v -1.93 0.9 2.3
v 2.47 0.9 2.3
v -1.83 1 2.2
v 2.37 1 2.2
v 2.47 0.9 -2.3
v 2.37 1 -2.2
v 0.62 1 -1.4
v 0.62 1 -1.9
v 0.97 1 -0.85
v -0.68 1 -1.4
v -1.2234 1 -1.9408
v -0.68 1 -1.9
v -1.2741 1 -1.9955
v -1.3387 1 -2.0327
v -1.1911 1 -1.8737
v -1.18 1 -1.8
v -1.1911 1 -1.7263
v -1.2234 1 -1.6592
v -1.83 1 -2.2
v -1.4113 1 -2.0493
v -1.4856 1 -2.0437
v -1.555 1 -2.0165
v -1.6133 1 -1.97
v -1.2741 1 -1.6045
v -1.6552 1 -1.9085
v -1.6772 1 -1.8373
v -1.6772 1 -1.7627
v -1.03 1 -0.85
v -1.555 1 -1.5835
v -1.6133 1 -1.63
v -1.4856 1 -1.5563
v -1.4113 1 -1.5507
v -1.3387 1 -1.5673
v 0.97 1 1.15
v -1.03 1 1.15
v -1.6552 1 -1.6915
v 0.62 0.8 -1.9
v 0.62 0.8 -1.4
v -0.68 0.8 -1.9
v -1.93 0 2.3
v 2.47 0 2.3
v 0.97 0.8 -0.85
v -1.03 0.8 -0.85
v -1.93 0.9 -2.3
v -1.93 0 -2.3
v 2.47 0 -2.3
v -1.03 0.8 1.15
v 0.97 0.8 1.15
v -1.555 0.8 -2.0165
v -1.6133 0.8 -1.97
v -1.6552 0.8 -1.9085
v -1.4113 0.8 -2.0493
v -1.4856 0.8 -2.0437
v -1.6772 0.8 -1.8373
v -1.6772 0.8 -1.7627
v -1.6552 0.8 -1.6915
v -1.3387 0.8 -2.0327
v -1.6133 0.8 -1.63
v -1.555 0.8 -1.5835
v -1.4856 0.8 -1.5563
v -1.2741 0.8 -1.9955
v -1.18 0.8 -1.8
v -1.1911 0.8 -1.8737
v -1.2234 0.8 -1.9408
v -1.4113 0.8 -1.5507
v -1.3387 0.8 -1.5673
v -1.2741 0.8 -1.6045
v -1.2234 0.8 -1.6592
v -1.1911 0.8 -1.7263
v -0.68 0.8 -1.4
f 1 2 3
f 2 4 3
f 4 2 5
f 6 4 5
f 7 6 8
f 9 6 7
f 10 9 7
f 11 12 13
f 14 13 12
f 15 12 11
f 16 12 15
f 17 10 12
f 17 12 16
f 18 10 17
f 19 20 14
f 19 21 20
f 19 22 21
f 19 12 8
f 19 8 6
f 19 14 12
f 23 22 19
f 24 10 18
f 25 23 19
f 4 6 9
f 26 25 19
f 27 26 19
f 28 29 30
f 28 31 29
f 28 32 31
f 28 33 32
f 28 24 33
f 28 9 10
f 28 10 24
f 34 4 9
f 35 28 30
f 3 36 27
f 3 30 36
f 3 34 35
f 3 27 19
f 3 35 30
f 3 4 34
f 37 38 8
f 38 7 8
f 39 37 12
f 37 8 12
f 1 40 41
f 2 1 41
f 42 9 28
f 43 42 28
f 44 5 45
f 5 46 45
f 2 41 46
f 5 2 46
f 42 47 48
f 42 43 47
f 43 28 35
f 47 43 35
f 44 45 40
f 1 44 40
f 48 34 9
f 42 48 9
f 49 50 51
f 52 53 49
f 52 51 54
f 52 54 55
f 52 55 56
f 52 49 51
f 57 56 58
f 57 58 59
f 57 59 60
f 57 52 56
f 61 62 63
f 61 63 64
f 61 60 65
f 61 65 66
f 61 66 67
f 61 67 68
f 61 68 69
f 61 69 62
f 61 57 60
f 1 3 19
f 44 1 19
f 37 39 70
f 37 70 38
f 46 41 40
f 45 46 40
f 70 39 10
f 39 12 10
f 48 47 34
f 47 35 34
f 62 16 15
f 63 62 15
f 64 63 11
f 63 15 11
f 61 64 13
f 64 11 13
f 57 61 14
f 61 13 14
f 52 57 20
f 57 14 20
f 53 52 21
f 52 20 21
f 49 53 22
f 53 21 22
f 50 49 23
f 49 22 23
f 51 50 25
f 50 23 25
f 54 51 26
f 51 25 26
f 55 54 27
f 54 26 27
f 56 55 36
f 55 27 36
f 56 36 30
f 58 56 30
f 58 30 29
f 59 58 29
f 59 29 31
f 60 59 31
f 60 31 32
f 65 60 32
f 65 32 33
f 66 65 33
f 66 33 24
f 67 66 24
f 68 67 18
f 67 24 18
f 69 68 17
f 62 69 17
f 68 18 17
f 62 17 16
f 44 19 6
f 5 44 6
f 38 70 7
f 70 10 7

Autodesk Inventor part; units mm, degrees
ref_plane "YZ Plane" through (0, 0, 0) normal (1, 0, 0) x (0, 1, 0)
ref_plane "XZ Plane" through (0, 0, 0) normal (0, 1, 0) x (-1, 0, 0)
sketch "Sketch1" plane through (0, 0, 0) normal (0, 1, 0) x (-1, 0, 0)
  line L0 (1.93, 2.3) -> (-2.47, 2.3)
  line L1 (-2.47, 2.3) -> (-2.47, -2.3)
  line L2 (-2.47, -2.3) -> (1.93, -2.3)
  line L3 (1.93, -2.3) -> (1.93, 2.3)
  line L4 (0, -3.22) -> (0, 3.22) construction
  line L5 (2.81, 0) -> (-3.35, 0) construction
  point P0 (0, 0)
  point P1 (-0.27, 2.3)
  point P2 (1.93, 0)
  dimension "d0" = 4.4
  dimension "d1" = 4.6
  dimension "d2" = 0.27
extrude "Extrusion1" add sketch "Sketch1" along normal blind 1
sketch "Sketch2" plane through (0, 1, 0) normal (0, 1, 0) x (1, 0, 0)
  line L0 (-1.03, -1.15) -> (0.97, -1.15)
  line L1 (0.97, -1.15) -> (0.97, 0.85)
  line L2 (0.97, 0.85) -> (-1.03, 0.85)
  line L3 (-1.03, 0.85) -> (-1.03, -1.15)
  line L4 (-1.93, 2.3) -> (-1.93, -2.3) projected
  line L5 (-1.93, -2.3) -> (2.47, -2.3) projected
  line L6 (-0.68, 1.4) -> (0.62, 1.4)
  line L7 (0.62, 1.4) -> (0.62, 1.9)
  line L8 (0.62, 1.9) -> (-0.68, 1.9)
  line L9 (-0.68, 1.9) -> (-0.68, 1.4)
  line L10 (2.47, 2.3) -> (-1.93, 2.3) projected
  circle A0 centre (-1.43, 1.8) radius 0.25
  point P0 (0, 0)
  point P1 (-0.03, 0.85)
  point P2 (-0.03, 1.4)
  dimension "d5" = 2
  dimension "d6" = 2
  dimension "d7" = 0.9
  dimension "d8" = 1.15
  dimension "d9" = 0.5
  dimension "d10" = 1.3
  dimension "d11" = 0.4
  dimension "d12" = 0.5
  dimension "d13" = 0.5
  dimension "d14" = 0.5
extrude "Extrusion2" cut sketch "Sketch2" against normal blind 0.2
chamfer "Chamfer1" distance 0.1 angle 45 4 edges at (-1.93, 1, 0) (0.27, 1, -2.3) (2.47, 1, 0) (0.27, 1, 2.3)
ref_plane "Work Plane2" through (0.62, 1, -1.125) normal (0, 0, -1) x (-1, 0, 0)
properties part number "Optical_sensor"
